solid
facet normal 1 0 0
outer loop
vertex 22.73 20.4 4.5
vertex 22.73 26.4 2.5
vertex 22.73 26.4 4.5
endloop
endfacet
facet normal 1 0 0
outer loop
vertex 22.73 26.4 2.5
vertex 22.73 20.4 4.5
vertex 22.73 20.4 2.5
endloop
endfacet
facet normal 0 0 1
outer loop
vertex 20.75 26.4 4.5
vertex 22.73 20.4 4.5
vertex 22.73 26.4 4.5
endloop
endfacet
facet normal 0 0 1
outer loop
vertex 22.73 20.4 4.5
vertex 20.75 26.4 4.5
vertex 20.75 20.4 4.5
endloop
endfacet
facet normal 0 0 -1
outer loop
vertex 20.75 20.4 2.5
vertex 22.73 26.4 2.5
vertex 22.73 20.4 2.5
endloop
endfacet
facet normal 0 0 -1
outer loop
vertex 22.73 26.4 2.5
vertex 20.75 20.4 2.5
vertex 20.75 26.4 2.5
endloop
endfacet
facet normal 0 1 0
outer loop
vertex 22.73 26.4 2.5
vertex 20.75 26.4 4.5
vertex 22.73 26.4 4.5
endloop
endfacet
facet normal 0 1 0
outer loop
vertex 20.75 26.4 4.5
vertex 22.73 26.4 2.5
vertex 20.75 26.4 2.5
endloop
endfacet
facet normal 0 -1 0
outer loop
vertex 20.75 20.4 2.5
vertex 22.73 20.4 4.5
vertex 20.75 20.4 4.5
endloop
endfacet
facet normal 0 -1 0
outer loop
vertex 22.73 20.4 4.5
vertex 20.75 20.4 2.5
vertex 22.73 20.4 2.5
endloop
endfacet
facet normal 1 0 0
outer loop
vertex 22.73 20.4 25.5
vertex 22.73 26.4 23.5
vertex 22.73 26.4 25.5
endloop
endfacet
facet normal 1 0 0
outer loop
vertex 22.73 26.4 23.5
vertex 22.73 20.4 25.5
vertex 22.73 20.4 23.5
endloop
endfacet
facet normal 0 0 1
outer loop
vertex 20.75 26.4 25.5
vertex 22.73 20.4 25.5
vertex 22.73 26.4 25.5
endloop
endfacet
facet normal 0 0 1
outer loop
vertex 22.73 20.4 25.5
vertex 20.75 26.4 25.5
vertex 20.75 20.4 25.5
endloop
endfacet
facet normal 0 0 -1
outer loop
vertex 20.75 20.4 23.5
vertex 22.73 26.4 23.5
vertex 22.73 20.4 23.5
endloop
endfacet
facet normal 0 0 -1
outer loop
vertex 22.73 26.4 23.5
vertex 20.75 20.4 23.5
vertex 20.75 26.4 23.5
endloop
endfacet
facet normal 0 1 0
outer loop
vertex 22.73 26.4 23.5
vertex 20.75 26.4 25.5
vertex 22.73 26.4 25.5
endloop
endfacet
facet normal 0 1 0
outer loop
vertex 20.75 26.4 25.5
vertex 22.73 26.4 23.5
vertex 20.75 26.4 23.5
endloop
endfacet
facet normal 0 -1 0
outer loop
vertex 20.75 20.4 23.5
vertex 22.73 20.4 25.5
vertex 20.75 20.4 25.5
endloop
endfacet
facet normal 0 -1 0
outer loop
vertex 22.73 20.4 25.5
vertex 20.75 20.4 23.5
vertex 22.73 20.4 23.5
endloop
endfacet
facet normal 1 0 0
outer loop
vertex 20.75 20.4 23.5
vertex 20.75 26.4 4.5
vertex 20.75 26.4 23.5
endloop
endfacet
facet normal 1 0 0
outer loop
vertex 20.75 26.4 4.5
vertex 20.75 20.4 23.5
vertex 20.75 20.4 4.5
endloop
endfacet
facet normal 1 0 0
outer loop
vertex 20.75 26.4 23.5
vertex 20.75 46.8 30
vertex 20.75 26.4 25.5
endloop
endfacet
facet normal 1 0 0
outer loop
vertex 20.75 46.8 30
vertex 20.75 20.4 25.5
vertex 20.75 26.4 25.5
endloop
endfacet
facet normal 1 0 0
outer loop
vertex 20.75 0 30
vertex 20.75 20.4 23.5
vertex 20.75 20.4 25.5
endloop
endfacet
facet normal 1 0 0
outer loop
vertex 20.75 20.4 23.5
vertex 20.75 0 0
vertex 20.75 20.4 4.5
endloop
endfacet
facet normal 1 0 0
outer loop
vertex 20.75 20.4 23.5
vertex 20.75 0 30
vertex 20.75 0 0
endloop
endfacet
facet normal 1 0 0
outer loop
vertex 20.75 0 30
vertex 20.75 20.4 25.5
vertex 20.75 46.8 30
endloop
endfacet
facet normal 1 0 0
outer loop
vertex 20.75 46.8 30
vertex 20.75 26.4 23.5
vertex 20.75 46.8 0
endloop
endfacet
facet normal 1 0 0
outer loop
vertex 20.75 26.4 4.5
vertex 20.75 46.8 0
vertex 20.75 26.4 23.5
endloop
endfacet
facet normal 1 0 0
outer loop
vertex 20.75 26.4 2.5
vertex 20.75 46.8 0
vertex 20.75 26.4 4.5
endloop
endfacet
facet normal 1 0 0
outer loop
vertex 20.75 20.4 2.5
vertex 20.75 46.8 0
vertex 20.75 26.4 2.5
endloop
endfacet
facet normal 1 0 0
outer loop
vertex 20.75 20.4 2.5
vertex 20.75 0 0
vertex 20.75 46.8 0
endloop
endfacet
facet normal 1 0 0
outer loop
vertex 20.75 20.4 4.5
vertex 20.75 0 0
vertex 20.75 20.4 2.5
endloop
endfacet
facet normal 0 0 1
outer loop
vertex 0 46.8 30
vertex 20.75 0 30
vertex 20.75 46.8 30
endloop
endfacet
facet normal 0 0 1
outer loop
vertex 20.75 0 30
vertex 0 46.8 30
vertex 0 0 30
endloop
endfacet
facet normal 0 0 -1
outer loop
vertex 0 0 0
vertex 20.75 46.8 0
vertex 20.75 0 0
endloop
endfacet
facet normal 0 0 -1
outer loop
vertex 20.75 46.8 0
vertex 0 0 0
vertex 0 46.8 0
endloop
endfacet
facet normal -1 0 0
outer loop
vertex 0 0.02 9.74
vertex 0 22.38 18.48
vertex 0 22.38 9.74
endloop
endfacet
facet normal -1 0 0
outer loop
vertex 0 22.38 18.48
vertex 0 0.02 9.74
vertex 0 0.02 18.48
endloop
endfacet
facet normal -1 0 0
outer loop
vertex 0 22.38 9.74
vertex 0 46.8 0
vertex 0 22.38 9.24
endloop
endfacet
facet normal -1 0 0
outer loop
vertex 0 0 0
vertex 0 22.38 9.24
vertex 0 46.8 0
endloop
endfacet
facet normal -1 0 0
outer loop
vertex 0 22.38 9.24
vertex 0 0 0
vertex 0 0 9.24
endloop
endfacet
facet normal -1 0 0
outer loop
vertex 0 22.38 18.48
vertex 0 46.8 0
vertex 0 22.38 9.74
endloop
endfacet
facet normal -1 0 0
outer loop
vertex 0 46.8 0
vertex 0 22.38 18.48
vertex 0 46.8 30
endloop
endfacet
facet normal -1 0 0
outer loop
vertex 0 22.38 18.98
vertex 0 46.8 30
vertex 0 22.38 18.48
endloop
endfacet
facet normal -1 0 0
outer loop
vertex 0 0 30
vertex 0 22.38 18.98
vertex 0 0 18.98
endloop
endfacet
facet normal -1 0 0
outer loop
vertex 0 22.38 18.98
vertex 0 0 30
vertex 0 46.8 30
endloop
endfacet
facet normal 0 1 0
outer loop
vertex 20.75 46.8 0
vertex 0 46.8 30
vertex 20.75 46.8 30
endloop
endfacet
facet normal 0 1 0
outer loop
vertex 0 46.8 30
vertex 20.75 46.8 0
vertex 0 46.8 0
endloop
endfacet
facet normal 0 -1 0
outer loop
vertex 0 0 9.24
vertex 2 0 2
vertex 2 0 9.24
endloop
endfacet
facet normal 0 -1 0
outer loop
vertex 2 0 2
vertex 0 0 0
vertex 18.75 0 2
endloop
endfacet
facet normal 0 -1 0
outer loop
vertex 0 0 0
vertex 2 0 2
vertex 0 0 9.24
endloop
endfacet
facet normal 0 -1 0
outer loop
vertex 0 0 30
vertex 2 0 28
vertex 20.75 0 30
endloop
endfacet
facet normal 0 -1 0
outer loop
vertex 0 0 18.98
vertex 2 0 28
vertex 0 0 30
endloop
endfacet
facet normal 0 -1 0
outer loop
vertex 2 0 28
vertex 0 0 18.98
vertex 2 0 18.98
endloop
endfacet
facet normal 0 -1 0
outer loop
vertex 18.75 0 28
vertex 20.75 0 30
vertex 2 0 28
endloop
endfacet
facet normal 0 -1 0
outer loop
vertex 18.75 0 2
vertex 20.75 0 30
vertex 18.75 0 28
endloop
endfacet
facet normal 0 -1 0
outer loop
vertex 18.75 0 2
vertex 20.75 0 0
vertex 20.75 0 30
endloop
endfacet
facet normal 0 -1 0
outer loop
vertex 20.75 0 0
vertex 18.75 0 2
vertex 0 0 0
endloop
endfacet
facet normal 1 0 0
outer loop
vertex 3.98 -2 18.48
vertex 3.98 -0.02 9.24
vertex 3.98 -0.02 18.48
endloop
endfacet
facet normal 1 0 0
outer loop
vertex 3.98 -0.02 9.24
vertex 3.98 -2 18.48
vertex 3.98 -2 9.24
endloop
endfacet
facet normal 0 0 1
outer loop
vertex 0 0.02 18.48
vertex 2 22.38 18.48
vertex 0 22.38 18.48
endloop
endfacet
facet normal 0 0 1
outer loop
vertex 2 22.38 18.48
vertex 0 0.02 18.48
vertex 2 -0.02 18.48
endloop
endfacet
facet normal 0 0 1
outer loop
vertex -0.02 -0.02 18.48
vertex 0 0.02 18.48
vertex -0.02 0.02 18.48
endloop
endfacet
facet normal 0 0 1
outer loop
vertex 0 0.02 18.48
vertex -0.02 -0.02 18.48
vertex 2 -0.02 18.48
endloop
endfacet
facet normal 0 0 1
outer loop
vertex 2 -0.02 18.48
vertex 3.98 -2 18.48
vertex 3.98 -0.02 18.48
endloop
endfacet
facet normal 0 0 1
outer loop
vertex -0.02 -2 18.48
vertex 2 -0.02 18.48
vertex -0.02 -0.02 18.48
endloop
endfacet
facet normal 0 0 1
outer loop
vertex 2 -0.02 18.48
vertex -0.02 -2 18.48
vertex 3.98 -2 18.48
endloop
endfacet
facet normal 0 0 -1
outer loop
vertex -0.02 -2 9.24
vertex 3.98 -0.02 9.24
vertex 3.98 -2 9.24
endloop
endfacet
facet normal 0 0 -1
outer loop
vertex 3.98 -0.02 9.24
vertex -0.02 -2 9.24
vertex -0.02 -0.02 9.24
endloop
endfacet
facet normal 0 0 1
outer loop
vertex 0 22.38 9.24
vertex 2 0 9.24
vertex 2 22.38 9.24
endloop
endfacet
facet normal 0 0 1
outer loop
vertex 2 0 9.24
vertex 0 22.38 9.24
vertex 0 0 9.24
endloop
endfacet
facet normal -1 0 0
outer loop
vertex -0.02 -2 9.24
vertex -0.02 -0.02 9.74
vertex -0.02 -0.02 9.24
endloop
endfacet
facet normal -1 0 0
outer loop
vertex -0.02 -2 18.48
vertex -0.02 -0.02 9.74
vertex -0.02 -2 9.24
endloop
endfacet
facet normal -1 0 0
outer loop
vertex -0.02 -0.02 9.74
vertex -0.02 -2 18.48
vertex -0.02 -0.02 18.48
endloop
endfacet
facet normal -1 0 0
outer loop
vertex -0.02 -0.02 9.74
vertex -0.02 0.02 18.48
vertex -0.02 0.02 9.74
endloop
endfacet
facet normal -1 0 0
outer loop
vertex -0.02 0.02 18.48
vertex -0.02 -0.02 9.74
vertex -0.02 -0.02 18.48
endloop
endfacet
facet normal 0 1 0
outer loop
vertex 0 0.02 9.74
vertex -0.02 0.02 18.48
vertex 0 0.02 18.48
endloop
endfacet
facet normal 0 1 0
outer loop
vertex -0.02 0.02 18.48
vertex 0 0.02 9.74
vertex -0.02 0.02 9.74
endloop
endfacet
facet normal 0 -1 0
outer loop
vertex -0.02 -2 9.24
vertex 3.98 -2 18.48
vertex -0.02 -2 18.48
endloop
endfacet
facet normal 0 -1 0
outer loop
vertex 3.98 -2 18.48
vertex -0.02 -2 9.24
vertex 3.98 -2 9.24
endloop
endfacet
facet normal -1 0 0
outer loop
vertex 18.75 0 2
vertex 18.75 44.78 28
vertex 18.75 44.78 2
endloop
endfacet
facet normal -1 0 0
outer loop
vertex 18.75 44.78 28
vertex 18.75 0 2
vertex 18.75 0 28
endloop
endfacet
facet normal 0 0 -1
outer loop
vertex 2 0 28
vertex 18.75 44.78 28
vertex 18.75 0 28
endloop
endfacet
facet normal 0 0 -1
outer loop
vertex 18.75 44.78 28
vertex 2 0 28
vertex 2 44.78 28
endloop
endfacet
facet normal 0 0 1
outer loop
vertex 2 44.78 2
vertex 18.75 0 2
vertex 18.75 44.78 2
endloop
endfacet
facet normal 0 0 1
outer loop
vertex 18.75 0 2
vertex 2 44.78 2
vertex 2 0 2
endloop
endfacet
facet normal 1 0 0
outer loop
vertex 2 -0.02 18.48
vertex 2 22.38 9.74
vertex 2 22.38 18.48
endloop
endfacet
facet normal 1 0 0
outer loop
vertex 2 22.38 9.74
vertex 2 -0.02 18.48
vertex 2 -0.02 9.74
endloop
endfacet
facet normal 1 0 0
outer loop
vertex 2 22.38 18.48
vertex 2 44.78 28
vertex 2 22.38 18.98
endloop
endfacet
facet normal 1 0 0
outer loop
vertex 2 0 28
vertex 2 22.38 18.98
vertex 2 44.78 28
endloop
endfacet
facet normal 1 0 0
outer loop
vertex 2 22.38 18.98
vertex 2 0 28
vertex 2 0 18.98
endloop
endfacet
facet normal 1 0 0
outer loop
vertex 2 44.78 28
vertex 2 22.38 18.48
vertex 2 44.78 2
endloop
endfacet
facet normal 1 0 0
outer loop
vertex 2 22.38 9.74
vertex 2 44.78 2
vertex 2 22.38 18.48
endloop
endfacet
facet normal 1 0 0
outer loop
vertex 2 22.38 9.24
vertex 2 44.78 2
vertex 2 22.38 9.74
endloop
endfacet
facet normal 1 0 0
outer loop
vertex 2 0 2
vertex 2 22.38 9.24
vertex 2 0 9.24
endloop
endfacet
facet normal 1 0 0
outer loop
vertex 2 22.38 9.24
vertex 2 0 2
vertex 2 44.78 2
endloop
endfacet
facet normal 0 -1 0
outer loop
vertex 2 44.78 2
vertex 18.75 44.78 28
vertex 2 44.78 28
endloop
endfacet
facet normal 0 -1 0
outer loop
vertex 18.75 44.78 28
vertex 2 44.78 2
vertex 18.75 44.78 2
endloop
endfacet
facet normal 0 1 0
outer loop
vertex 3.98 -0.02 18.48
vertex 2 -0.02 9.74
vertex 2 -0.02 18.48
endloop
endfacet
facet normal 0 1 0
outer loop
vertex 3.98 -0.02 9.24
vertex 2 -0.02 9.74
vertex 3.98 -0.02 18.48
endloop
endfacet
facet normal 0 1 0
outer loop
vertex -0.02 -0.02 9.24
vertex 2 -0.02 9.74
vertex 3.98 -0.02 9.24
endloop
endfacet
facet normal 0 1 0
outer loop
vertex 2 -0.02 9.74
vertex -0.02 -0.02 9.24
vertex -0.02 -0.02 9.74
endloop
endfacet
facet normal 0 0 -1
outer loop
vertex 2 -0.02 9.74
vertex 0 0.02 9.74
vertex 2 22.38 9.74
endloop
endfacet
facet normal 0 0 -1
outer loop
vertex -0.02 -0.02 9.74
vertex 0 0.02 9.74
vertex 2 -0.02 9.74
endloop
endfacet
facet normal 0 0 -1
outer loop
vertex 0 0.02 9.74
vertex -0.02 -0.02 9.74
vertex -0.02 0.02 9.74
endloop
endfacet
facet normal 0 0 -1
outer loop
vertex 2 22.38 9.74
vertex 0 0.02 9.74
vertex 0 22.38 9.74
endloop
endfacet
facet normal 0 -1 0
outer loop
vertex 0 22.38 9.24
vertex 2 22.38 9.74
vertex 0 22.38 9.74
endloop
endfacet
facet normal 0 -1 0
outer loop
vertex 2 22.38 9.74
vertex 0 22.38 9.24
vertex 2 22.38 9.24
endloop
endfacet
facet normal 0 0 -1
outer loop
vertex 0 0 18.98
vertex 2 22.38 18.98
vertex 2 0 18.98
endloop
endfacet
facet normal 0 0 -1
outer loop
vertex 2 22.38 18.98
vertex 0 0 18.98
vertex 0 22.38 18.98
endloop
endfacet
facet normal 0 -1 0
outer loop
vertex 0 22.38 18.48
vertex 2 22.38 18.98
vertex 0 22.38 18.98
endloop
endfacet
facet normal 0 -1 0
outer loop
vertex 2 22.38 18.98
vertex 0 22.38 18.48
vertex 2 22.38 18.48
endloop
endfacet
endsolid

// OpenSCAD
// All measurements in mm
// Battery dimensions with it laying on it's short side, terminals to the left

battery_h = 26;  // height of battery
battery_w = 16.75;  // depth of battery
battery_l = 44.8;  // length of battery
shell = 2;  // thickness of box

slot = true;  // (bool) auto-centered slot alignment protrusions
slot_h = 19;  // width of "slot" protrusions
slot_w = 6;  // length of "slot" protrusions


difference() {
  union () {
    // Battery box:
    cube([battery_w + (shell * 2),
          battery_l + shell,
          battery_h + (shell * 2)]);
    // retainer clip
    translate([-.02, -1 * shell, (battery_h + shell) * .33]) 
      cube([shell * 2, shell + .02, (battery_h + shell) * .33]);
    if (slot) {
      translate([battery_w + shell * 2 - .02,
                (battery_l + shell) / 2 - (slot_w / 2),
                (battery_h + shell) / 2 - (slot_h / 2) - shell])
        cube([shell, slot_w, shell]);
      translate([battery_w + shell * 2 - .02,
                (battery_l + shell) / 2 - (slot_w / 2),
                (battery_h + shell) / 2 + (slot_h / 2)])
        cube([shell, slot_w, shell]);
    }
    
  }
    
  translate([shell, -.02, shell]) cube([battery_w, battery_l, battery_h]);
  translate([-.02, -.02, (battery_h + shell) * .33]) 
    cube([shell + .04, battery_l / 2, .5]);
  translate([-.02, -.02, (battery_h + shell) * .66]) 
    cube([shell + .04, battery_l / 2, .5]);
}
